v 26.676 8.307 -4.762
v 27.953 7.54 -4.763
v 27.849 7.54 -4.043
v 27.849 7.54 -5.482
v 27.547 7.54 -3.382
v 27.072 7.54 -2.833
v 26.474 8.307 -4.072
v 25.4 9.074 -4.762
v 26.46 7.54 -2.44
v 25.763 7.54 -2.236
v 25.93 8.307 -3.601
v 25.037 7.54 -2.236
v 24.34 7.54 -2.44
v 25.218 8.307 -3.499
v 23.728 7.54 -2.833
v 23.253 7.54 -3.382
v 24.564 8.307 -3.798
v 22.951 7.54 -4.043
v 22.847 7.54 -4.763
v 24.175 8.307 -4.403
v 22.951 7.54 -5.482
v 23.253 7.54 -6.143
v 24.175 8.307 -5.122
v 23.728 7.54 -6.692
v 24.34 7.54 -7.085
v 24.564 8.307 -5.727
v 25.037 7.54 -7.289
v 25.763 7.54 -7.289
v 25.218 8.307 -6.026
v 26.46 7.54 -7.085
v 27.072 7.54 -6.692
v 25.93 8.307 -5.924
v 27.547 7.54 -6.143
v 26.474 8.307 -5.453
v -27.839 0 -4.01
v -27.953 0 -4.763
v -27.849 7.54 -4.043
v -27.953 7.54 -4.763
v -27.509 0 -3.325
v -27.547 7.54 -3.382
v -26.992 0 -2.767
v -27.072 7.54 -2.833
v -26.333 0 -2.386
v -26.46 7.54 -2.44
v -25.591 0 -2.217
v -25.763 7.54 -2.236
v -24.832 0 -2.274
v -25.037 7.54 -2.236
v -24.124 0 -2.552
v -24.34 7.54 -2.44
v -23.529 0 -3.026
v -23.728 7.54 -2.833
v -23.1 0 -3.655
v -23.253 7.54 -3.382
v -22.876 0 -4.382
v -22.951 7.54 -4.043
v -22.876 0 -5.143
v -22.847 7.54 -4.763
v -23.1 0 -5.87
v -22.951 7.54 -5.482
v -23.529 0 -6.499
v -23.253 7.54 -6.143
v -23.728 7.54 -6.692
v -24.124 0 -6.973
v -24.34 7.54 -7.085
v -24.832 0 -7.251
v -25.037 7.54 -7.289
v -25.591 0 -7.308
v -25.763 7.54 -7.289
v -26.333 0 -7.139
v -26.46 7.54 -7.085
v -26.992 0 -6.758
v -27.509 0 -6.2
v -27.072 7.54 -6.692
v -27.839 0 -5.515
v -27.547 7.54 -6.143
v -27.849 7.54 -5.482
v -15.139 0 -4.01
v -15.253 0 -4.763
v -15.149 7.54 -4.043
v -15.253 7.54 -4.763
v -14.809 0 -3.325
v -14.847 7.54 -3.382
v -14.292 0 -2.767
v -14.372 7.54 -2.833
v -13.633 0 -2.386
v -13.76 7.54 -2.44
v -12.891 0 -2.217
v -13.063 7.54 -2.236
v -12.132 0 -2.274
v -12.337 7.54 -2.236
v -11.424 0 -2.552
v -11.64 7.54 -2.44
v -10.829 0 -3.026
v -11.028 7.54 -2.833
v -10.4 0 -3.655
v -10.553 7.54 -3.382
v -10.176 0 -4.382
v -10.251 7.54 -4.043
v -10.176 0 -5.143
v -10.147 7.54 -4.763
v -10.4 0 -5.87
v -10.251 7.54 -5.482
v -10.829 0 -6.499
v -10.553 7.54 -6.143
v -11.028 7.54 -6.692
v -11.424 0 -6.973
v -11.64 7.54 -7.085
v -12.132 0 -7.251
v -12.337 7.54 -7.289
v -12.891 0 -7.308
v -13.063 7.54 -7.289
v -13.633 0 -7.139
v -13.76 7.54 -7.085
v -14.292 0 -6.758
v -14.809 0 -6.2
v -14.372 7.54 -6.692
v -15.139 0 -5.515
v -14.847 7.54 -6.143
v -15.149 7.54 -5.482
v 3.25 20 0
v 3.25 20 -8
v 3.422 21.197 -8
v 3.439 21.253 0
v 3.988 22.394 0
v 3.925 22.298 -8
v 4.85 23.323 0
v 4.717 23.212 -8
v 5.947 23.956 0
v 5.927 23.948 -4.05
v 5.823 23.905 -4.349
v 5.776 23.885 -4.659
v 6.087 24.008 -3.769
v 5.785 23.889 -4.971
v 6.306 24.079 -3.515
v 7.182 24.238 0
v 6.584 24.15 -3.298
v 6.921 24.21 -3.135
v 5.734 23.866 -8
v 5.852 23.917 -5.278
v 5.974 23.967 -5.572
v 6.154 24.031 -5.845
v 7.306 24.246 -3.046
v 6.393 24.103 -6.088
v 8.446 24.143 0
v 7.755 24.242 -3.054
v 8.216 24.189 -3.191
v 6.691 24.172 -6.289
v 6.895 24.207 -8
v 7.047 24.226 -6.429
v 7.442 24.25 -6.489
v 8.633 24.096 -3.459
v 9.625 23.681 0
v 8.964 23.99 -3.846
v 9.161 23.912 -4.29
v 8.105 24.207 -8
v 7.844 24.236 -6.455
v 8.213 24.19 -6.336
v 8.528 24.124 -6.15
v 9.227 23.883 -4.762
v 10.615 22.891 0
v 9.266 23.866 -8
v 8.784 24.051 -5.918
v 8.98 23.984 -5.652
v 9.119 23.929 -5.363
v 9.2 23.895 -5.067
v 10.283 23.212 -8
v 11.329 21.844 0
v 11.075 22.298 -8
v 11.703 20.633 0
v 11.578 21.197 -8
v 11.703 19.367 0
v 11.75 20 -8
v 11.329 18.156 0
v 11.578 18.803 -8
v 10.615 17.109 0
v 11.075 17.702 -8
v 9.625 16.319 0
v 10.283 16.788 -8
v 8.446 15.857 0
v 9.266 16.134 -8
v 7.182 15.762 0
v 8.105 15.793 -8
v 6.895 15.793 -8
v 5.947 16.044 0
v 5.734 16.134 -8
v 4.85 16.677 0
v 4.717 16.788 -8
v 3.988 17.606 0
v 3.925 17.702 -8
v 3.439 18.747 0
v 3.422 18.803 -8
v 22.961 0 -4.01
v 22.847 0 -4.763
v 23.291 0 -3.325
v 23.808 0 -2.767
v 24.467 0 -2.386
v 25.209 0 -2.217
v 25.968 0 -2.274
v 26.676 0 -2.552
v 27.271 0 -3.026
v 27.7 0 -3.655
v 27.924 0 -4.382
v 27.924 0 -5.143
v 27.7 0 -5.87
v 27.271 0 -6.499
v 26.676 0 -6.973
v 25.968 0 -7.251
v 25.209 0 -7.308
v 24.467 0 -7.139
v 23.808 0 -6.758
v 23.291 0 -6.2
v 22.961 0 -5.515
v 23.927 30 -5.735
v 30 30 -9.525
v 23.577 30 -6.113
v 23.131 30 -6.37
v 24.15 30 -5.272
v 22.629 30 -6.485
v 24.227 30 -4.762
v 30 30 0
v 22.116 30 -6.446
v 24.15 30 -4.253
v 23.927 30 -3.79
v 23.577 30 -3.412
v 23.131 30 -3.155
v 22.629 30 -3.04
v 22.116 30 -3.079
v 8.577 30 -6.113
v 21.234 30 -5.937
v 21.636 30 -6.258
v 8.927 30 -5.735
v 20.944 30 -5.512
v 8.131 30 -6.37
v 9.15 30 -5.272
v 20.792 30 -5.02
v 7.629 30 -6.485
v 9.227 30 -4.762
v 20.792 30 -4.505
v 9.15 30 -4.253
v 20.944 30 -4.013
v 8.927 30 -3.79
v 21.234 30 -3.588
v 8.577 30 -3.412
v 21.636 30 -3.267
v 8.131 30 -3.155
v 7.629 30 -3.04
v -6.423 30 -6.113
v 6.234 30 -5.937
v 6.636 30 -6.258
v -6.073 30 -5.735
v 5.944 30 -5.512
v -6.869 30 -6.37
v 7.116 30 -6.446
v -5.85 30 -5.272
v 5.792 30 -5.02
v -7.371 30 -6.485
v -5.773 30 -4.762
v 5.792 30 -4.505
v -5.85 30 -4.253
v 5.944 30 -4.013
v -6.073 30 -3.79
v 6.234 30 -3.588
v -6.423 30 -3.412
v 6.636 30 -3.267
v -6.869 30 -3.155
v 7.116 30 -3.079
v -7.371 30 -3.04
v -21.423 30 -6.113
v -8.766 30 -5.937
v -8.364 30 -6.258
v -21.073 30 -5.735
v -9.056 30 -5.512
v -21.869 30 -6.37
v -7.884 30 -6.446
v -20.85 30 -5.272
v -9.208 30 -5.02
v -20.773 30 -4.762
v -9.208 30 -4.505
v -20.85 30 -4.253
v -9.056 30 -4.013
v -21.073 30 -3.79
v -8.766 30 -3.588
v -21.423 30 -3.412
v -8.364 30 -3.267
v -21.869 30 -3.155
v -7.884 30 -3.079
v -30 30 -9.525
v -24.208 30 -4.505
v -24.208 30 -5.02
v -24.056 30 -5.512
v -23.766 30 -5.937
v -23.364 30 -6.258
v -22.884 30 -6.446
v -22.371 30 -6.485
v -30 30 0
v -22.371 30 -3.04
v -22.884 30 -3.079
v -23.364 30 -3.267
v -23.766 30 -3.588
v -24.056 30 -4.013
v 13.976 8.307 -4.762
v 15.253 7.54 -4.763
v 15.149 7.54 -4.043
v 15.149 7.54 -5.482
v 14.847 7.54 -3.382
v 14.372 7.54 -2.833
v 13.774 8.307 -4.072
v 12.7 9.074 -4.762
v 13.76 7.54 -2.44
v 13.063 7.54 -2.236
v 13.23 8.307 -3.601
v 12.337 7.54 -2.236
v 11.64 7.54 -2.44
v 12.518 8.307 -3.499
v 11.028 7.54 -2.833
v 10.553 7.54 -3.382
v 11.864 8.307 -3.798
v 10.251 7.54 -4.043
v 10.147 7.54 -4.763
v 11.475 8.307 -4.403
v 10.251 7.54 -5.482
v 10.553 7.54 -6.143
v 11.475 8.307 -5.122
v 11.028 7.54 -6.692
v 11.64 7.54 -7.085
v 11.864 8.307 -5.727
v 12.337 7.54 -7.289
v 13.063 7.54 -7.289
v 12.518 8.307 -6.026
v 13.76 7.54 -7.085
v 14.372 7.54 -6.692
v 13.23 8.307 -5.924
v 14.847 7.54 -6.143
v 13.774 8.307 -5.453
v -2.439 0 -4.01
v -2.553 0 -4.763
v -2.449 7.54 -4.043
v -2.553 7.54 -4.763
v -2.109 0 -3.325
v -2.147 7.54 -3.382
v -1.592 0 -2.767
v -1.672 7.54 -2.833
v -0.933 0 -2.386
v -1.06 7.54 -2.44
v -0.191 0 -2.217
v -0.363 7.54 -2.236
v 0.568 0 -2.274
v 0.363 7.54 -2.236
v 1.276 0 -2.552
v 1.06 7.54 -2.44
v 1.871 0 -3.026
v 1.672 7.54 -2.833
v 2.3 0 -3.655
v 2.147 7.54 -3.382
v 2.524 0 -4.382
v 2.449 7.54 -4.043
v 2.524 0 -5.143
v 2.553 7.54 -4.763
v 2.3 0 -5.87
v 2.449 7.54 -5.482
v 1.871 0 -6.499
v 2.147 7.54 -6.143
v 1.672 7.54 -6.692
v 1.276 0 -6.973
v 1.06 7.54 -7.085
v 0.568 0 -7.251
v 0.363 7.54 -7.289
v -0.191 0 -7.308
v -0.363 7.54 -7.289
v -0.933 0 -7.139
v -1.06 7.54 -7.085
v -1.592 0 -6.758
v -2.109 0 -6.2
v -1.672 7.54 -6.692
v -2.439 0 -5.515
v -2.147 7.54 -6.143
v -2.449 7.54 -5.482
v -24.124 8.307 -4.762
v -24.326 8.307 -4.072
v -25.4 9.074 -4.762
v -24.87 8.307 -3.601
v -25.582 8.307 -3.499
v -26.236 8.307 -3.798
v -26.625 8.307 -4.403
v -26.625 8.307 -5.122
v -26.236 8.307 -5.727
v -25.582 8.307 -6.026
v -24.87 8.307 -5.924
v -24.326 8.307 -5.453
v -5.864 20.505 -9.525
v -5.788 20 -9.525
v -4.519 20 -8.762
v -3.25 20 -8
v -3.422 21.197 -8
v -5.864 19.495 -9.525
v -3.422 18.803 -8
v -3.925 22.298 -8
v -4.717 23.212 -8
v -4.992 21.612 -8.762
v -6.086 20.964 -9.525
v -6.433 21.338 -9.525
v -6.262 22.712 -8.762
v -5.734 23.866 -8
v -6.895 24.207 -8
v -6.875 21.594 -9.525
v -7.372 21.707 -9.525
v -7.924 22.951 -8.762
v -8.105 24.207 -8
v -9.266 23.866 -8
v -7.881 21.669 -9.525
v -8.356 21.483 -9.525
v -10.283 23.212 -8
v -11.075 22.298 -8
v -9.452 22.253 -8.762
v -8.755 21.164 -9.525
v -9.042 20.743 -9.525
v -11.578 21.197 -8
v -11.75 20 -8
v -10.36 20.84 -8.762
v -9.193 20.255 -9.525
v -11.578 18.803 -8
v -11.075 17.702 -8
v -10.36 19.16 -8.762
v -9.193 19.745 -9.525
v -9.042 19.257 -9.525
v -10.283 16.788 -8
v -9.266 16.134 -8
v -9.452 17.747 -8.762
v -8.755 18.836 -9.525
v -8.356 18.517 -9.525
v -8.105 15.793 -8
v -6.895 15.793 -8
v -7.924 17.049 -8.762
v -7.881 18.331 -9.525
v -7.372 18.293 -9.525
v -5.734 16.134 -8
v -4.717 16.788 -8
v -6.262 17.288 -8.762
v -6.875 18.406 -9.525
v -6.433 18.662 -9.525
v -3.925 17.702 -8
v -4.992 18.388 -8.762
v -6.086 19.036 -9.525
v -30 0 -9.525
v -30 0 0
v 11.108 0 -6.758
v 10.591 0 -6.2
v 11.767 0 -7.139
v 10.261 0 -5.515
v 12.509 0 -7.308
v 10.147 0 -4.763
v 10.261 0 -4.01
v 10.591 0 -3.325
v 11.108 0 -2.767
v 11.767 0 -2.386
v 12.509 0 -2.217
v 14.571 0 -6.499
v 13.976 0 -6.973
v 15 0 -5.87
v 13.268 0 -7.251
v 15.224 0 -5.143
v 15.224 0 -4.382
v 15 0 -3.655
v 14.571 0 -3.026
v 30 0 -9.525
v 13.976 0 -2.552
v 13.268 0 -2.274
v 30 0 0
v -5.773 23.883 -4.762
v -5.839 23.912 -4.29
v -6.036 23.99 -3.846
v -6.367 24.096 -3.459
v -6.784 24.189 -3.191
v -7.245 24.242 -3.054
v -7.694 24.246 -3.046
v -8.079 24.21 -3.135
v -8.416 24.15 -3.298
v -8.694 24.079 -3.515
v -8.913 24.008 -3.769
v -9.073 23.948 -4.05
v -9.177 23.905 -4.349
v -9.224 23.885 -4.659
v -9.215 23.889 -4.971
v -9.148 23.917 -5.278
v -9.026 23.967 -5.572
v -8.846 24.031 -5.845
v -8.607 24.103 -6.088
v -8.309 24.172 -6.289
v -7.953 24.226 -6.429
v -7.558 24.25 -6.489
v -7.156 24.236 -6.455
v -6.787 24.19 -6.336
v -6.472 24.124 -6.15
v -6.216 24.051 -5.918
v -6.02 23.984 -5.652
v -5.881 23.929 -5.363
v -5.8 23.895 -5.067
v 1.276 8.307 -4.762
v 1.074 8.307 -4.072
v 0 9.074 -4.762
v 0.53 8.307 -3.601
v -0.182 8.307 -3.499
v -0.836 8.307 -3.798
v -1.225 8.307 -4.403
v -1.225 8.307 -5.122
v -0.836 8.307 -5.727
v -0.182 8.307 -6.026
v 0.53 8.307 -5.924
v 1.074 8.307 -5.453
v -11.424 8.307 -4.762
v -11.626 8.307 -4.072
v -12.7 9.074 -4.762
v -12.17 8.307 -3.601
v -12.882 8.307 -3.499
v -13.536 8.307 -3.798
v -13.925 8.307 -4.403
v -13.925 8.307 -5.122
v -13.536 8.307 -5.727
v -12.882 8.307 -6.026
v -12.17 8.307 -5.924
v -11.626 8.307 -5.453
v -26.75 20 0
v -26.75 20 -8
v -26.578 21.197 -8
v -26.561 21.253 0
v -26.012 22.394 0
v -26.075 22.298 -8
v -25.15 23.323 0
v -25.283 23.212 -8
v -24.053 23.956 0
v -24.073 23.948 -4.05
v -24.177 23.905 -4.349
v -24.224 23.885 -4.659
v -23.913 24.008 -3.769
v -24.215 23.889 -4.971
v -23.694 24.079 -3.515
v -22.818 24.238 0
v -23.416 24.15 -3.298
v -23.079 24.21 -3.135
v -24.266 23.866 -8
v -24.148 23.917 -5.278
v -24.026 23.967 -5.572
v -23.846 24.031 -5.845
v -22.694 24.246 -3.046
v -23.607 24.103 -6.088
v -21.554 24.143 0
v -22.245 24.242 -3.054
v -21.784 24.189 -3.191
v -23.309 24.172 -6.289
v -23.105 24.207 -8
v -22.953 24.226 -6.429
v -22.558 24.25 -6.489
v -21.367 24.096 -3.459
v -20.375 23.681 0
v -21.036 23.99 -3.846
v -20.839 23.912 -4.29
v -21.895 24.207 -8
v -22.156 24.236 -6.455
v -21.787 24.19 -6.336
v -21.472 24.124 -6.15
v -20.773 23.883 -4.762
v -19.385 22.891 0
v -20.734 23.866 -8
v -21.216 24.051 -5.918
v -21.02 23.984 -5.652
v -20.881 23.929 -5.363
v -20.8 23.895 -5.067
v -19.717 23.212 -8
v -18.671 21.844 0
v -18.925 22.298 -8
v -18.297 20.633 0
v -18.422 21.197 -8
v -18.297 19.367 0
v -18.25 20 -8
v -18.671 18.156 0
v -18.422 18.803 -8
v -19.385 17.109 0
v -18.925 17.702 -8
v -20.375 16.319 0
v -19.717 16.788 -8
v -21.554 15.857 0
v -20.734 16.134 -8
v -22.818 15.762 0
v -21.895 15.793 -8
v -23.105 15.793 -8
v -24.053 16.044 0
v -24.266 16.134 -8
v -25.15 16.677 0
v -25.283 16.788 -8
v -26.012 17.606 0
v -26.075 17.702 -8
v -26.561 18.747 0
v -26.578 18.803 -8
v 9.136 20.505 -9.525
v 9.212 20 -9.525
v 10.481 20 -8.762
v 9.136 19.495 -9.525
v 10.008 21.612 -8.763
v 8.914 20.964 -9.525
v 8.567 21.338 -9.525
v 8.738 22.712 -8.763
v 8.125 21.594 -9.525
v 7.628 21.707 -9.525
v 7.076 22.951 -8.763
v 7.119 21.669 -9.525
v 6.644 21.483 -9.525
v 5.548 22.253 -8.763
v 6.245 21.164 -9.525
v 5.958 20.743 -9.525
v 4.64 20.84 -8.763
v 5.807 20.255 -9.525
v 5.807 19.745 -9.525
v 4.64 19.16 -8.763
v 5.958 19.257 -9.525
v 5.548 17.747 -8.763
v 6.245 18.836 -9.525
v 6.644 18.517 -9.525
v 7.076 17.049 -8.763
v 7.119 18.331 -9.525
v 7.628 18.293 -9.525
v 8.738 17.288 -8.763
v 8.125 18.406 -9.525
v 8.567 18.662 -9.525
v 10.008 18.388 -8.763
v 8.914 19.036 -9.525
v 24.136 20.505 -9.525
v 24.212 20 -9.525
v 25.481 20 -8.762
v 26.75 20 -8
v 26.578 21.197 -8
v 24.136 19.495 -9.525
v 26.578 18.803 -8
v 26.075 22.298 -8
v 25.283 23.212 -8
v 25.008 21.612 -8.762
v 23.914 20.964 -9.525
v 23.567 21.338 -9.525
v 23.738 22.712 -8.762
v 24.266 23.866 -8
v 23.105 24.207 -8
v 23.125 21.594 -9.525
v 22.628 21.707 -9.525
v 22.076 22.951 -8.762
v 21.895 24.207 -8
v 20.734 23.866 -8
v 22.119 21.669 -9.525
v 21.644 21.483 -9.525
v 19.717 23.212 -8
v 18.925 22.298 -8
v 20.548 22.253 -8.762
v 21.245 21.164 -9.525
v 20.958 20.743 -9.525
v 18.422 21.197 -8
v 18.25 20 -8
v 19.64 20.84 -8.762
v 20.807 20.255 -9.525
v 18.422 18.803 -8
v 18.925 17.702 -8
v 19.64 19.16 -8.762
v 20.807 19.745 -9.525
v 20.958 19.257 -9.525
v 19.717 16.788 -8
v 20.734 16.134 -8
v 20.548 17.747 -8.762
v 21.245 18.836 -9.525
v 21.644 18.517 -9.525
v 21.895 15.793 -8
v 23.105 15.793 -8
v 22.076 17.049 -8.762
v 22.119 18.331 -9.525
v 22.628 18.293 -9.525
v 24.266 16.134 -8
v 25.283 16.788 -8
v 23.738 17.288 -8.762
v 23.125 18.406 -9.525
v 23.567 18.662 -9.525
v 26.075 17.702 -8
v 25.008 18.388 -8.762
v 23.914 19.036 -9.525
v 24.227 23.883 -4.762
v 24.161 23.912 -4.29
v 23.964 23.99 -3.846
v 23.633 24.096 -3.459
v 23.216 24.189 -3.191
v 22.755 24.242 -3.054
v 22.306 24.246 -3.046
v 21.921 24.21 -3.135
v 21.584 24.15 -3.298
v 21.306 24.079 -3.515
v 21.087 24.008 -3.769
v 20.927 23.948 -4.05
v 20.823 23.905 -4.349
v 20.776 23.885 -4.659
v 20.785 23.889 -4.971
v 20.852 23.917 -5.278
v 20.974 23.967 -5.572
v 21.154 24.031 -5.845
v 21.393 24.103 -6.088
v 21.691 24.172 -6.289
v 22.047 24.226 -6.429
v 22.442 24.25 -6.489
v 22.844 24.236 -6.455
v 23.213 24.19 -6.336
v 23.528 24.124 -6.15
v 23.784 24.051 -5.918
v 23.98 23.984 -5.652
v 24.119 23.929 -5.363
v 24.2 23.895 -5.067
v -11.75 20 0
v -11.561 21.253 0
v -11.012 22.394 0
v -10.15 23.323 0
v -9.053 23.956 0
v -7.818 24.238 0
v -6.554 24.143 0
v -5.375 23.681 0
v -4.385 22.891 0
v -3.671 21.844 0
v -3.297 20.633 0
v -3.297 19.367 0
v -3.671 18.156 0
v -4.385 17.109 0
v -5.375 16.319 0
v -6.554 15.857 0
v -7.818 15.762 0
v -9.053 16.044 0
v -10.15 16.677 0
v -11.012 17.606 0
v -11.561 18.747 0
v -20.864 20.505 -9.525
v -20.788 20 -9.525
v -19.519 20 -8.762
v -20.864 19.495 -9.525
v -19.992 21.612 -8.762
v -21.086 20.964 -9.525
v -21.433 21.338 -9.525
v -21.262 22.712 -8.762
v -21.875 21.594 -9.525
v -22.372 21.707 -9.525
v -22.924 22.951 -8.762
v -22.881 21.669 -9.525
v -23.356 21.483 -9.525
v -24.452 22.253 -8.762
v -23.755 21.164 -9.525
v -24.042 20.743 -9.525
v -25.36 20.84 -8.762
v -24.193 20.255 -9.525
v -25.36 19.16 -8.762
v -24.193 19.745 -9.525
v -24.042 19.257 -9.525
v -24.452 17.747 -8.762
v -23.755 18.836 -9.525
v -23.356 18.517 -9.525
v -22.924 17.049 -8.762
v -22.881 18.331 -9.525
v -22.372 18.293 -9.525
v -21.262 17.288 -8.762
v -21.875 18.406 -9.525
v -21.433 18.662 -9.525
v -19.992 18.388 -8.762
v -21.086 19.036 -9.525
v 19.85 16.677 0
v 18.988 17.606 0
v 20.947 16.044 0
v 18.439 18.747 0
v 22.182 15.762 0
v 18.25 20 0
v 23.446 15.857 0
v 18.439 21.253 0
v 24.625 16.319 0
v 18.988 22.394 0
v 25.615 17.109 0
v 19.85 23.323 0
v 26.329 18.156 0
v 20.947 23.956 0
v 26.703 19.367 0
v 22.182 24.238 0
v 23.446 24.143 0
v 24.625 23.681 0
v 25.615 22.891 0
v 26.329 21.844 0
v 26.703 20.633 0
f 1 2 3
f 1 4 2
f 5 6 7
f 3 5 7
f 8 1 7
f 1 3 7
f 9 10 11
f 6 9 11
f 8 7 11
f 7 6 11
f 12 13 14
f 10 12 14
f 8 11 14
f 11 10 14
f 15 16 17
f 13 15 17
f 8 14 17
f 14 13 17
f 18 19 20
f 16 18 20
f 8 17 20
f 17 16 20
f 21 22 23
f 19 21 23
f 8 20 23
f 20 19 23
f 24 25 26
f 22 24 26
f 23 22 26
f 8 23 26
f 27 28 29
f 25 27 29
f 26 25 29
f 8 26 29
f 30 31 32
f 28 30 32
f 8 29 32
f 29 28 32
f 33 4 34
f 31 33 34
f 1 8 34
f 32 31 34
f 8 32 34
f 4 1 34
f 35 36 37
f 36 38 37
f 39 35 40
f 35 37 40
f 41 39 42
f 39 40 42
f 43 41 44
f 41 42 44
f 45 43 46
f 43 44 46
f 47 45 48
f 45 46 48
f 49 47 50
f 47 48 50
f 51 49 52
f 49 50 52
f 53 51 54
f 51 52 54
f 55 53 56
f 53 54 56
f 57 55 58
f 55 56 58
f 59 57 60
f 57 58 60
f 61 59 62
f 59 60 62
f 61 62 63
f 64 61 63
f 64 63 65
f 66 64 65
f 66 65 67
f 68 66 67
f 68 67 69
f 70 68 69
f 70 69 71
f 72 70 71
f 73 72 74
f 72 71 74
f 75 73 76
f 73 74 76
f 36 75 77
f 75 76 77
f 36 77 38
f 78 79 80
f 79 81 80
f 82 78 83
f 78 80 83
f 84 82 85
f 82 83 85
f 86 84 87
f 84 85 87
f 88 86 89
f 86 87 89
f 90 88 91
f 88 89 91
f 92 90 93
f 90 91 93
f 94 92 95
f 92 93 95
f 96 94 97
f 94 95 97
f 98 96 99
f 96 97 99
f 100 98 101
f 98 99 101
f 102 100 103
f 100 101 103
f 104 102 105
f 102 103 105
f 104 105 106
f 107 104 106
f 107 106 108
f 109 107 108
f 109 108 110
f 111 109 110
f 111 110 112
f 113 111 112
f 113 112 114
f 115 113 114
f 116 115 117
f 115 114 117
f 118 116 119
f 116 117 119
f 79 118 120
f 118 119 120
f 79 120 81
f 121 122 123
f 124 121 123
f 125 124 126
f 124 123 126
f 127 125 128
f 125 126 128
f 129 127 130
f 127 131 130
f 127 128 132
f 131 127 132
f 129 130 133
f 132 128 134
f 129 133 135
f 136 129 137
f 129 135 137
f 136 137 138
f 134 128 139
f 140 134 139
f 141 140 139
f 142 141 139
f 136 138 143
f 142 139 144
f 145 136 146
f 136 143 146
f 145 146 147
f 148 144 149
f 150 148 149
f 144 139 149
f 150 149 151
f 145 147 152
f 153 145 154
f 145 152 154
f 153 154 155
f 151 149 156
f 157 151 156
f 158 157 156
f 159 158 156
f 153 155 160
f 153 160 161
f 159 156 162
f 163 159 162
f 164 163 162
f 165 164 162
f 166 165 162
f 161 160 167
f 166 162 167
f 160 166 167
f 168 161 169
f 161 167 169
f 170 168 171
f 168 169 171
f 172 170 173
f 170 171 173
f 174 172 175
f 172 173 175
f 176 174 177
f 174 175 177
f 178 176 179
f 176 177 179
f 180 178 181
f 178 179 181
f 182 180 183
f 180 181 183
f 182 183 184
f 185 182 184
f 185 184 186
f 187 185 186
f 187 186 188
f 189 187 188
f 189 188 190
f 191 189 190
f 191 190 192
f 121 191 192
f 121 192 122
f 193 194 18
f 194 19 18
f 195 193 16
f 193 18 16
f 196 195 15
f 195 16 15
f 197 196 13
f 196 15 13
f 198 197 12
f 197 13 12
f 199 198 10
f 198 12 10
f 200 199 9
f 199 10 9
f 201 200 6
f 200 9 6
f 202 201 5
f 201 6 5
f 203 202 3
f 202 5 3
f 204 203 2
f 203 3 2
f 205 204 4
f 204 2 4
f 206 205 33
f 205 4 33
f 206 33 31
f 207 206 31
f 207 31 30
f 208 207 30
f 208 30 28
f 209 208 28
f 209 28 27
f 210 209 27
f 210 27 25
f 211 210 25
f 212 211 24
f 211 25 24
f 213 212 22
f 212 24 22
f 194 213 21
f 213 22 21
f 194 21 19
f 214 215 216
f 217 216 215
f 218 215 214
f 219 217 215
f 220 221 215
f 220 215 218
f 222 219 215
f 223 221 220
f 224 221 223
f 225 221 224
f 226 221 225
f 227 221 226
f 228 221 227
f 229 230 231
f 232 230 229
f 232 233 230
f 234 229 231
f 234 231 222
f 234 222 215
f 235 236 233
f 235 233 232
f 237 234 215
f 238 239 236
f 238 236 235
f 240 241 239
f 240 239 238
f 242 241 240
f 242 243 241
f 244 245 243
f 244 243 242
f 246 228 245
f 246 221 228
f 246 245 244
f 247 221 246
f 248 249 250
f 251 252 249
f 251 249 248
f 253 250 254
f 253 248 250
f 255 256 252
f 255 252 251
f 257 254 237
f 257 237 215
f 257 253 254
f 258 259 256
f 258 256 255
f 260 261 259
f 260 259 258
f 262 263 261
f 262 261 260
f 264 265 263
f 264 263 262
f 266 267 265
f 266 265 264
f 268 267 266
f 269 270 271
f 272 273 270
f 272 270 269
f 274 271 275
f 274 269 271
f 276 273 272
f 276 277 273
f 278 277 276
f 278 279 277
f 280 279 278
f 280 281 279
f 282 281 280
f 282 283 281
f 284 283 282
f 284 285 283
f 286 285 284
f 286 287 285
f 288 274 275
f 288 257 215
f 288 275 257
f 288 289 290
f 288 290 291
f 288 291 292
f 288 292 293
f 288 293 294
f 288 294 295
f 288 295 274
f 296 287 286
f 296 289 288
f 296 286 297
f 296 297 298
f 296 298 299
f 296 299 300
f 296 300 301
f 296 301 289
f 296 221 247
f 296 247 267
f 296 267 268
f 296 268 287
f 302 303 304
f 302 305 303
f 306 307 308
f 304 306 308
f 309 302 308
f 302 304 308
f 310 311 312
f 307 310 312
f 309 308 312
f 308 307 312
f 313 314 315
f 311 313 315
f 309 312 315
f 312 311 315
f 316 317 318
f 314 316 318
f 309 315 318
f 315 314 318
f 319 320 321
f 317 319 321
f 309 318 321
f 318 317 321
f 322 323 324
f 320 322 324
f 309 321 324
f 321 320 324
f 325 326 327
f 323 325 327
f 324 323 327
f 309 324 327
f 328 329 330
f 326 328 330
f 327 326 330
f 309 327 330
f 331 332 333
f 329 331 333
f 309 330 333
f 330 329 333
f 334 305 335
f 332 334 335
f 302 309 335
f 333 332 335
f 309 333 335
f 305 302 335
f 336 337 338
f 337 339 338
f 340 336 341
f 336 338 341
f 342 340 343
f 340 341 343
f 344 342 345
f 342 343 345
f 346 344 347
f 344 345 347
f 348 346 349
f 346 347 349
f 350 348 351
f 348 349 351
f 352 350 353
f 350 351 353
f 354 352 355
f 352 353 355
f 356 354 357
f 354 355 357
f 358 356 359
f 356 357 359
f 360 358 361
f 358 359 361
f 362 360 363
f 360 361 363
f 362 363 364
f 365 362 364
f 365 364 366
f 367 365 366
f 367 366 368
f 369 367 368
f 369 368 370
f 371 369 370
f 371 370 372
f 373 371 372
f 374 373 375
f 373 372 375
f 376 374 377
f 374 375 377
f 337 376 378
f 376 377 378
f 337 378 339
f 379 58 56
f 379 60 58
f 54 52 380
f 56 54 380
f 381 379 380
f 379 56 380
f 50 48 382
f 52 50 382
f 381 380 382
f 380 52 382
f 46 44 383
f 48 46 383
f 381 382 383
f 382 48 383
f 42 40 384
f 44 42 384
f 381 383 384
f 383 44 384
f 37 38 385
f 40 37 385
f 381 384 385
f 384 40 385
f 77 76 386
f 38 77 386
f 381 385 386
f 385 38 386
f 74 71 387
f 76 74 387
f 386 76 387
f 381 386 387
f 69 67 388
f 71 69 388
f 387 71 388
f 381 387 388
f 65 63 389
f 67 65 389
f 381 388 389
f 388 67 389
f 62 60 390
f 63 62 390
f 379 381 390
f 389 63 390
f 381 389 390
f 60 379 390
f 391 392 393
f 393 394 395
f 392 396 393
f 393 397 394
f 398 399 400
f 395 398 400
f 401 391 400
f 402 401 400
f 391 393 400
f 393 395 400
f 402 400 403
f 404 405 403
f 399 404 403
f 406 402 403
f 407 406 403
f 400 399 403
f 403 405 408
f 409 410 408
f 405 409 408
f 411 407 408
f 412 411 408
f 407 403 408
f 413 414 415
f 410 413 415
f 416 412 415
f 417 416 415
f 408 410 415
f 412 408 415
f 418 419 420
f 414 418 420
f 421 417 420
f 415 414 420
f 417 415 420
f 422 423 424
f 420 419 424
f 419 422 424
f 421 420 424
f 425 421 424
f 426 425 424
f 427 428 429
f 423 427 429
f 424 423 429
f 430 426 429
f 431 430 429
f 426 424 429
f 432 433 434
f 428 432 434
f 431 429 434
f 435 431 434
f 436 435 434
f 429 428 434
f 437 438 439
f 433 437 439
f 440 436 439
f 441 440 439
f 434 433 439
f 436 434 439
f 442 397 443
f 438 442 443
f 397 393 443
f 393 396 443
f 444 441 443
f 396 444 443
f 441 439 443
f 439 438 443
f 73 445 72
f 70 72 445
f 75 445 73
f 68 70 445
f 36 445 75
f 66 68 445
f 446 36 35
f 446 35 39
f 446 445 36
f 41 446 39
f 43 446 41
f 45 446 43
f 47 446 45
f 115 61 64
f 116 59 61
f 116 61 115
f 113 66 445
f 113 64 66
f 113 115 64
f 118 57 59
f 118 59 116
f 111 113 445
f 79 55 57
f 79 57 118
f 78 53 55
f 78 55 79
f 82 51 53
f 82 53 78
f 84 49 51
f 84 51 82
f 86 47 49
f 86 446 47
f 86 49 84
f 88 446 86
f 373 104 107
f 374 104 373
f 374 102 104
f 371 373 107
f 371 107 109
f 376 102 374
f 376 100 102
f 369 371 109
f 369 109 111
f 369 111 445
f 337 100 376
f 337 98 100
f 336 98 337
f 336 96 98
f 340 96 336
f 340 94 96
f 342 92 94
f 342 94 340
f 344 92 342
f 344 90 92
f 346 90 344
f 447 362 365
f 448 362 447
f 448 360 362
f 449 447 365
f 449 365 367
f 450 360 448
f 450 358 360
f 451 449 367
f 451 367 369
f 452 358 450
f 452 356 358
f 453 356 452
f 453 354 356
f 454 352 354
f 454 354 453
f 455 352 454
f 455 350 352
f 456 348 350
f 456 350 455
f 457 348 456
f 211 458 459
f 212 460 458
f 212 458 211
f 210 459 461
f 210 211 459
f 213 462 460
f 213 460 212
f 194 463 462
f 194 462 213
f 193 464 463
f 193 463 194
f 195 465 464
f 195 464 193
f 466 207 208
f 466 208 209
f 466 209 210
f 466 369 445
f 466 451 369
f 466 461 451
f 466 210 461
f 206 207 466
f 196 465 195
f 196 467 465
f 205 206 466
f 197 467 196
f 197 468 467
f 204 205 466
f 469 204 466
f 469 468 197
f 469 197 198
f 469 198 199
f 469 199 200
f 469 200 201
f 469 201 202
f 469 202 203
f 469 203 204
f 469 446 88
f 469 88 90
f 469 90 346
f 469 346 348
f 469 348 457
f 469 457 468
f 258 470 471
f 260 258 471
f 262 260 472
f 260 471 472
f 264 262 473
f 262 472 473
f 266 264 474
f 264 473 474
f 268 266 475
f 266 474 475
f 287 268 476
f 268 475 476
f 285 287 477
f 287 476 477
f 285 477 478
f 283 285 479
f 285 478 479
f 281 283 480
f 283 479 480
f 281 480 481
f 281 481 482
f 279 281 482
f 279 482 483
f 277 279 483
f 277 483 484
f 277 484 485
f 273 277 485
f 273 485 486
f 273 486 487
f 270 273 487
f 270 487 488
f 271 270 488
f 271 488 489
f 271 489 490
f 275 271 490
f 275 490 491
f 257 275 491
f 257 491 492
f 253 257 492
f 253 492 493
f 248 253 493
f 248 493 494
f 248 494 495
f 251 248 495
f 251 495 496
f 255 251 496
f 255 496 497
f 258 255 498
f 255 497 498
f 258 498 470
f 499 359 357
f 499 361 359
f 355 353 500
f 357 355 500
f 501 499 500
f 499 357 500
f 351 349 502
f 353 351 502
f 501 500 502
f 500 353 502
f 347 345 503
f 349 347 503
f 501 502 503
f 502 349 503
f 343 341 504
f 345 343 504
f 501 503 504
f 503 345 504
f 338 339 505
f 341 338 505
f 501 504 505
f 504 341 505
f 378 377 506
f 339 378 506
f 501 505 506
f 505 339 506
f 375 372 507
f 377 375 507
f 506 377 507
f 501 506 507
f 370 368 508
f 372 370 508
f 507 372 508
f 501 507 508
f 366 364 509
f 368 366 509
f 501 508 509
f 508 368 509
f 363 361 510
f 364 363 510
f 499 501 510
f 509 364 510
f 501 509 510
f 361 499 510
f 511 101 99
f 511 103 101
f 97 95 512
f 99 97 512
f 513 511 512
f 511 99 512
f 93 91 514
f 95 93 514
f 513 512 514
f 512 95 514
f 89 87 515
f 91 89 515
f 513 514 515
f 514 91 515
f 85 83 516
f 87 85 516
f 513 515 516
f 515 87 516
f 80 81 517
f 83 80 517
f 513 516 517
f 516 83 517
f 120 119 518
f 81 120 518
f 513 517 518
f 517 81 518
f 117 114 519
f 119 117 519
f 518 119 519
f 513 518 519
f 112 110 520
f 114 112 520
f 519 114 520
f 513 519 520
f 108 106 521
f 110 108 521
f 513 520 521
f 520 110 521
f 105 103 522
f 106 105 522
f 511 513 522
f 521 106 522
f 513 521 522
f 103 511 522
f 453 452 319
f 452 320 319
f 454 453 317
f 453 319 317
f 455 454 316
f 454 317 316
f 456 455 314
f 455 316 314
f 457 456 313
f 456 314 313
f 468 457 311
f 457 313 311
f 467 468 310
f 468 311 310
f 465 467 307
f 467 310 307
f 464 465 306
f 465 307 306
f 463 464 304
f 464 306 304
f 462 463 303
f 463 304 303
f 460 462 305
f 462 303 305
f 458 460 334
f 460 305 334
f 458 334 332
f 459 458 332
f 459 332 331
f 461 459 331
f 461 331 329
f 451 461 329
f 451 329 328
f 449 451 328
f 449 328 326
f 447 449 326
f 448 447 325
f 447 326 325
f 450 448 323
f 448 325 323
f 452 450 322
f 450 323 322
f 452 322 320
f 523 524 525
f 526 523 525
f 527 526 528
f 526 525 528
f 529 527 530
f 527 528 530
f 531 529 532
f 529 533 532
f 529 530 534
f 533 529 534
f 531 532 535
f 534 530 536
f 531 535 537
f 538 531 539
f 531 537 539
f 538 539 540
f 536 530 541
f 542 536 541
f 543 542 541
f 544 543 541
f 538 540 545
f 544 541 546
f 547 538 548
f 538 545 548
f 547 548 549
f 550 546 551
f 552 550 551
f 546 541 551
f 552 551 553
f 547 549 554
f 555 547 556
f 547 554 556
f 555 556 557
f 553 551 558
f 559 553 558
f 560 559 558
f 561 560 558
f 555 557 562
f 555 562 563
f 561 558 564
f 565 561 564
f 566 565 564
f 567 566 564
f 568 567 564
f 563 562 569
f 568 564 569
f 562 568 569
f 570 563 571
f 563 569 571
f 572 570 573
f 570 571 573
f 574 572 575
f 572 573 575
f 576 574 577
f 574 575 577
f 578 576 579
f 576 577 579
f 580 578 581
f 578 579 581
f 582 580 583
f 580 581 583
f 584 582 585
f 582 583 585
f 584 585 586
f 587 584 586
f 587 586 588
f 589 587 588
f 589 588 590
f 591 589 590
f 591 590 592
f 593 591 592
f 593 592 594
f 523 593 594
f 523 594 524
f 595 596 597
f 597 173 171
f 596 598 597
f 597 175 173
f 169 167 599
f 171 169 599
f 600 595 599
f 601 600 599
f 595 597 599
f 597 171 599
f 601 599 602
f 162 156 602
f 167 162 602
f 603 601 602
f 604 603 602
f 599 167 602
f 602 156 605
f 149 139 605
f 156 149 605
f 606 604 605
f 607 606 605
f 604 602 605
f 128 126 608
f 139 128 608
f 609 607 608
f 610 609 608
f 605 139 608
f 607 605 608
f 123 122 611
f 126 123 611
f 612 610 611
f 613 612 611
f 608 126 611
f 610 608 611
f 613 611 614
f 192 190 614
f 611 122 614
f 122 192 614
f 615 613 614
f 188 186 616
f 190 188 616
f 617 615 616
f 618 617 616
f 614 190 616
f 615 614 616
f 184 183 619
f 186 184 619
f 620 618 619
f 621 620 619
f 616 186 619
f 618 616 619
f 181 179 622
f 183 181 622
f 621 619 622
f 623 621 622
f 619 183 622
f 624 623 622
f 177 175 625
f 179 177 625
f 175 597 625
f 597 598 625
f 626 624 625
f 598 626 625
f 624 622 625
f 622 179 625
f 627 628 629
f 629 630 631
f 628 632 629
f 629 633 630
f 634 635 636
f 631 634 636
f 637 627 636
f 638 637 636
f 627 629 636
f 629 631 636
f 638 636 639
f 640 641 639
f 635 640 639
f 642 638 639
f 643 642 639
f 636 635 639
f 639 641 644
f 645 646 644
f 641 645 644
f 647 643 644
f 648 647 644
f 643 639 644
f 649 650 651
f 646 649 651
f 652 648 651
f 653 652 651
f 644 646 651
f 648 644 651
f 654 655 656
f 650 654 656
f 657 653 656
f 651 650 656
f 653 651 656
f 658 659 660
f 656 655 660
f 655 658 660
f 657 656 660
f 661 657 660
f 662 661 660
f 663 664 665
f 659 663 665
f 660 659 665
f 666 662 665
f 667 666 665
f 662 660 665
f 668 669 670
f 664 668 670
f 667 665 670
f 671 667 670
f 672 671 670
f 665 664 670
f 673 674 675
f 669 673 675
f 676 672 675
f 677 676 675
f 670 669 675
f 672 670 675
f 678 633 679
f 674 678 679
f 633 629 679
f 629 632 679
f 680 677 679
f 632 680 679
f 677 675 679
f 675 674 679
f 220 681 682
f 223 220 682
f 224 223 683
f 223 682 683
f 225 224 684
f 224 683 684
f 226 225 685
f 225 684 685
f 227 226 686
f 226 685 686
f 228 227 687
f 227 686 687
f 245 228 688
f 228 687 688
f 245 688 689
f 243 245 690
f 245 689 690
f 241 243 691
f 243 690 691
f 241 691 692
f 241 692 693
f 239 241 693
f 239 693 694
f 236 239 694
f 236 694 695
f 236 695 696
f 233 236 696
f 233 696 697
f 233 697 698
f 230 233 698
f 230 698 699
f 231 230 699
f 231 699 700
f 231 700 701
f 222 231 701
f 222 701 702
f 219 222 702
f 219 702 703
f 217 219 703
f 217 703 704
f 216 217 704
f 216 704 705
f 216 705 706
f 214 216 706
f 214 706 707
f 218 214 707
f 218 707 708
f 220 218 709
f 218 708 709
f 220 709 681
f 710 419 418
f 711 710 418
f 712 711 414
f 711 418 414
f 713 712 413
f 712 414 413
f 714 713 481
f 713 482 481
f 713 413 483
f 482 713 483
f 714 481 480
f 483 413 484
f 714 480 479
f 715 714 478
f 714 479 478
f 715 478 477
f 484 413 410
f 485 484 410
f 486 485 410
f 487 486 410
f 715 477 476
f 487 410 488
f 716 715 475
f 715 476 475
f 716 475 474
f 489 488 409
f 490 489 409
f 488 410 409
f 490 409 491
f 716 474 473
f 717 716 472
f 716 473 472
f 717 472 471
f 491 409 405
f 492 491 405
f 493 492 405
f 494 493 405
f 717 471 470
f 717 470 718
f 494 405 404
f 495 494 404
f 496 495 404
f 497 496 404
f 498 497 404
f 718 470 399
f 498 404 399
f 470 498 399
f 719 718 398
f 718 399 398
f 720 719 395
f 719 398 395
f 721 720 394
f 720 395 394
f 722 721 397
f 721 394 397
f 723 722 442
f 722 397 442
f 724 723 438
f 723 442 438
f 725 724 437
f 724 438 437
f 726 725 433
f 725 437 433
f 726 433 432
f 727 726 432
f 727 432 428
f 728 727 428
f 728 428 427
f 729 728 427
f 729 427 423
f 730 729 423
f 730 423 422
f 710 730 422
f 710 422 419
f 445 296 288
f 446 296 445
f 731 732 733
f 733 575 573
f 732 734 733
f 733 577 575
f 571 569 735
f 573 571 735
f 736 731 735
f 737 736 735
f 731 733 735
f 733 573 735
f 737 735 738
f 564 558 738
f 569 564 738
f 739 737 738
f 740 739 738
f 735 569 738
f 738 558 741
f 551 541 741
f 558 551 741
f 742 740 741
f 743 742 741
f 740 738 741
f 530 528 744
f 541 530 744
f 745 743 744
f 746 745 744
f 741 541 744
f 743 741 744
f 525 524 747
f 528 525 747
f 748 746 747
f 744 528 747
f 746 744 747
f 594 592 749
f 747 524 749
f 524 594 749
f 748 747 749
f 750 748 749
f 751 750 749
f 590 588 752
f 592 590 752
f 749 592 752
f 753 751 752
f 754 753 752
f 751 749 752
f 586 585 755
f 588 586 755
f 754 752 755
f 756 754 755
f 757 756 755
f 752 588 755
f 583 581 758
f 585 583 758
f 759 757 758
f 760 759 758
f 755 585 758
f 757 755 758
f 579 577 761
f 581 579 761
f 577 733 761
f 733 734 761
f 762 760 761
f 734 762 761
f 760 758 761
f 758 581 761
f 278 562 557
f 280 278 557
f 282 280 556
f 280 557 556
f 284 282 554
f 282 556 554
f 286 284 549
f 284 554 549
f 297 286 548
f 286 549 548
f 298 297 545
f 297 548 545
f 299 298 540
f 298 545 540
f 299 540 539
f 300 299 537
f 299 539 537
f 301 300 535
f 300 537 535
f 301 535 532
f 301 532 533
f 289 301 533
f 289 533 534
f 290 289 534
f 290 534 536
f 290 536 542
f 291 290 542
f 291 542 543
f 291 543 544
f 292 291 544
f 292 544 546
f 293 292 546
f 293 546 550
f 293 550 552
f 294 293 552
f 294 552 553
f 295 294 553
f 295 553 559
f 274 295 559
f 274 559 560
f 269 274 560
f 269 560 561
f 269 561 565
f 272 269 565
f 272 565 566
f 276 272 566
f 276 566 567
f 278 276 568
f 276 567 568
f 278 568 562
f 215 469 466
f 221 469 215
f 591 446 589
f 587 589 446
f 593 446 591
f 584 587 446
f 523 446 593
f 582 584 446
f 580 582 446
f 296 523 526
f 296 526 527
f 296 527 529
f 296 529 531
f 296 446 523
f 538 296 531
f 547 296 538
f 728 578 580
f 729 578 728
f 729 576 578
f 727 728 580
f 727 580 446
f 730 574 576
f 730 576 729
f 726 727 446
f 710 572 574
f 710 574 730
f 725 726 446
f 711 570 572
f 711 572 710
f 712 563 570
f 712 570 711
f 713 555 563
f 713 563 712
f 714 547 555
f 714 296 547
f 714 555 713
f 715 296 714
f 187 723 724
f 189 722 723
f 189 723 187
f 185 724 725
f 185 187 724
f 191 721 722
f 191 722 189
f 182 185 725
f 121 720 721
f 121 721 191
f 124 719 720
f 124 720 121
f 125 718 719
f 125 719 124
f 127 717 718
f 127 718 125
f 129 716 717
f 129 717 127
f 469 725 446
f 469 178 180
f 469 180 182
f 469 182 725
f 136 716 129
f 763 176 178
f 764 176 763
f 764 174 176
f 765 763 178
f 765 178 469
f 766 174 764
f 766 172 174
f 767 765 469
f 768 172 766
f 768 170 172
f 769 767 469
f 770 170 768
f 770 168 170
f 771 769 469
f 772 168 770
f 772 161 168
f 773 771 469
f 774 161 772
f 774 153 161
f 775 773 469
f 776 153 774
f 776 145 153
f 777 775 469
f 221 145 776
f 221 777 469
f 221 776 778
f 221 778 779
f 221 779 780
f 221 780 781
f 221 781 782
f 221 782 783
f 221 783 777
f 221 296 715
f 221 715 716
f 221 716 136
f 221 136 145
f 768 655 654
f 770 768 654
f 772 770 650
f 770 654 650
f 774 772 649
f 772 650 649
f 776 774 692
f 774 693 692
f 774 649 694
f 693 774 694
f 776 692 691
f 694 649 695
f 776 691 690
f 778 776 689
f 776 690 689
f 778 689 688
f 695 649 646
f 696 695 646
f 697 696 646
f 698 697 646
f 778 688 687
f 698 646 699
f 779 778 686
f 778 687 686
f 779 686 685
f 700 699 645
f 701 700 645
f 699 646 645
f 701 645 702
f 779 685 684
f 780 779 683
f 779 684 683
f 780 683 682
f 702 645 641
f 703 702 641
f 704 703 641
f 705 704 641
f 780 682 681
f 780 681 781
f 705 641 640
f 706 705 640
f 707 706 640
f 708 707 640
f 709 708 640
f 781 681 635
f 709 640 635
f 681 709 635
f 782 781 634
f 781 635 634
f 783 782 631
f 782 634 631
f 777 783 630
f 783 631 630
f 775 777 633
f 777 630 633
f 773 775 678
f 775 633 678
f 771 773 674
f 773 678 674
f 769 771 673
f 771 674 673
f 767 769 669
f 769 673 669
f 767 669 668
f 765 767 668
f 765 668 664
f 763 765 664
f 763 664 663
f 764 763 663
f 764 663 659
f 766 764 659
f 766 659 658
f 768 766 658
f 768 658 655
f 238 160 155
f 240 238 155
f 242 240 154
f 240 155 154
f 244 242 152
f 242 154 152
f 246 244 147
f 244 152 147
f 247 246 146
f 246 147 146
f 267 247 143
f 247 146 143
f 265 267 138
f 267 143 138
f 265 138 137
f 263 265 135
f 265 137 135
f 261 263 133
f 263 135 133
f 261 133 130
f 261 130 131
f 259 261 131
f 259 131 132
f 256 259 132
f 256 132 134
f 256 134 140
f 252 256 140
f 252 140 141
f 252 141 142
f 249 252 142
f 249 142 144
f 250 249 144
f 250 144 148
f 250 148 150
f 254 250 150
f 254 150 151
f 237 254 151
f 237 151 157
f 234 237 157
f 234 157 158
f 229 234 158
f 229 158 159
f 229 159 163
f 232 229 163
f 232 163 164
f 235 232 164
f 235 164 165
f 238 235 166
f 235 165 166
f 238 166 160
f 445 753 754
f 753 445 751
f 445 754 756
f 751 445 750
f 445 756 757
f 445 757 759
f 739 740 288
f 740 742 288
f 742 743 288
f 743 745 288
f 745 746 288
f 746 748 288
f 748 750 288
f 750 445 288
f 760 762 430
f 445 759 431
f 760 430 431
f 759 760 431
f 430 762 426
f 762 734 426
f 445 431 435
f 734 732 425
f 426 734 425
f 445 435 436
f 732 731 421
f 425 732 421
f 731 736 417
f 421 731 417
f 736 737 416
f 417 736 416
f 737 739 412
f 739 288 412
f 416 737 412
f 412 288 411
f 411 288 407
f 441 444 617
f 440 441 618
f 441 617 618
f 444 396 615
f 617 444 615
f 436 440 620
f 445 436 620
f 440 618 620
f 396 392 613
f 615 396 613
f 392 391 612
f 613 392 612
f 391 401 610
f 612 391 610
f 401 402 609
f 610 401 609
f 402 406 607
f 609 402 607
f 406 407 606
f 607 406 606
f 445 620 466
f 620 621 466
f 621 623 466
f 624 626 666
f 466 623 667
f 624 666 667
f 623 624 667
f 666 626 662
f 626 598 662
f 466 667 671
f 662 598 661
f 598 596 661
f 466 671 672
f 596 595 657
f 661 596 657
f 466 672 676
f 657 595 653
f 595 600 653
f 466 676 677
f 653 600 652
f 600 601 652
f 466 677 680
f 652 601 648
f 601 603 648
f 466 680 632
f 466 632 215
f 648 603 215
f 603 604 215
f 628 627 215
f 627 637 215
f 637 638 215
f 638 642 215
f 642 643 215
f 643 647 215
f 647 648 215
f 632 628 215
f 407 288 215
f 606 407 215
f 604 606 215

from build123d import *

# Parameters (mm, degrees)
F1_DEPTH = 9.525
F2_D     = 8.5
F2_DEPTH = 8
F2_TIP   = 2.5536576309
F4_D     = 5.1054
F4_DEPTH = 7.54
F4_TIP   = 1.5338169022
F6_D     = 3.4544
F6_DEPTH = 6.5875
F6_TIP   = 1.0378064612


with BuildPart() as f1:
    # F0 (on Top) → F1 (new body)
    with BuildSketch(Plane.XY):
        Polygon((-30, 0), (0, 0), (30, 0), (30, 30), (0, 30), (-30, 30), align=None)
    extrude(amount=-F1_DEPTH)

    # F2
    with Locations(Plane.XY):
        with Locations((-22.5, 20), (-7.5, 20), (7.5, 20), (22.5, 20)):
            Hole(F2_D / 2, depth=F2_DEPTH)
            with Locations((0, 0, -(F2_DEPTH + F2_TIP / 2))):  # 118° drill point
                Cone(0, F2_D / 2, F2_TIP, mode=Mode.SUBTRACT)

    # F4
    with Locations(Plane.XZ):
        with Locations((-25.4, -4.7625), (-12.7, -4.7625), (0, -4.7625), (12.7, -4.7625), (25.4, -4.7625)):
            Hole(F4_D / 2, depth=F4_DEPTH)
            with Locations((0, 0, -(F4_DEPTH + F4_TIP / 2))):  # 118° drill point
                Cone(0, F4_D / 2, F4_TIP, mode=Mode.SUBTRACT)

    # F6
    with Locations(Plane(origin=(0, 30, 0), x_dir=(-1, 0, 0), z_dir=(0, 1, 0))):
        with Locations((-22.5, -4.7625), (-7.5, -4.7625), (7.5, -4.7625), (22.5, -4.7625)):
            Hole(F6_D / 2, depth=F6_DEPTH)
            with Locations((0, 0, -(F6_DEPTH + F6_TIP / 2))):  # 118° drill point
                Cone(0, F6_D / 2, F6_TIP, mode=Mode.SUBTRACT)


solid = f1.part
